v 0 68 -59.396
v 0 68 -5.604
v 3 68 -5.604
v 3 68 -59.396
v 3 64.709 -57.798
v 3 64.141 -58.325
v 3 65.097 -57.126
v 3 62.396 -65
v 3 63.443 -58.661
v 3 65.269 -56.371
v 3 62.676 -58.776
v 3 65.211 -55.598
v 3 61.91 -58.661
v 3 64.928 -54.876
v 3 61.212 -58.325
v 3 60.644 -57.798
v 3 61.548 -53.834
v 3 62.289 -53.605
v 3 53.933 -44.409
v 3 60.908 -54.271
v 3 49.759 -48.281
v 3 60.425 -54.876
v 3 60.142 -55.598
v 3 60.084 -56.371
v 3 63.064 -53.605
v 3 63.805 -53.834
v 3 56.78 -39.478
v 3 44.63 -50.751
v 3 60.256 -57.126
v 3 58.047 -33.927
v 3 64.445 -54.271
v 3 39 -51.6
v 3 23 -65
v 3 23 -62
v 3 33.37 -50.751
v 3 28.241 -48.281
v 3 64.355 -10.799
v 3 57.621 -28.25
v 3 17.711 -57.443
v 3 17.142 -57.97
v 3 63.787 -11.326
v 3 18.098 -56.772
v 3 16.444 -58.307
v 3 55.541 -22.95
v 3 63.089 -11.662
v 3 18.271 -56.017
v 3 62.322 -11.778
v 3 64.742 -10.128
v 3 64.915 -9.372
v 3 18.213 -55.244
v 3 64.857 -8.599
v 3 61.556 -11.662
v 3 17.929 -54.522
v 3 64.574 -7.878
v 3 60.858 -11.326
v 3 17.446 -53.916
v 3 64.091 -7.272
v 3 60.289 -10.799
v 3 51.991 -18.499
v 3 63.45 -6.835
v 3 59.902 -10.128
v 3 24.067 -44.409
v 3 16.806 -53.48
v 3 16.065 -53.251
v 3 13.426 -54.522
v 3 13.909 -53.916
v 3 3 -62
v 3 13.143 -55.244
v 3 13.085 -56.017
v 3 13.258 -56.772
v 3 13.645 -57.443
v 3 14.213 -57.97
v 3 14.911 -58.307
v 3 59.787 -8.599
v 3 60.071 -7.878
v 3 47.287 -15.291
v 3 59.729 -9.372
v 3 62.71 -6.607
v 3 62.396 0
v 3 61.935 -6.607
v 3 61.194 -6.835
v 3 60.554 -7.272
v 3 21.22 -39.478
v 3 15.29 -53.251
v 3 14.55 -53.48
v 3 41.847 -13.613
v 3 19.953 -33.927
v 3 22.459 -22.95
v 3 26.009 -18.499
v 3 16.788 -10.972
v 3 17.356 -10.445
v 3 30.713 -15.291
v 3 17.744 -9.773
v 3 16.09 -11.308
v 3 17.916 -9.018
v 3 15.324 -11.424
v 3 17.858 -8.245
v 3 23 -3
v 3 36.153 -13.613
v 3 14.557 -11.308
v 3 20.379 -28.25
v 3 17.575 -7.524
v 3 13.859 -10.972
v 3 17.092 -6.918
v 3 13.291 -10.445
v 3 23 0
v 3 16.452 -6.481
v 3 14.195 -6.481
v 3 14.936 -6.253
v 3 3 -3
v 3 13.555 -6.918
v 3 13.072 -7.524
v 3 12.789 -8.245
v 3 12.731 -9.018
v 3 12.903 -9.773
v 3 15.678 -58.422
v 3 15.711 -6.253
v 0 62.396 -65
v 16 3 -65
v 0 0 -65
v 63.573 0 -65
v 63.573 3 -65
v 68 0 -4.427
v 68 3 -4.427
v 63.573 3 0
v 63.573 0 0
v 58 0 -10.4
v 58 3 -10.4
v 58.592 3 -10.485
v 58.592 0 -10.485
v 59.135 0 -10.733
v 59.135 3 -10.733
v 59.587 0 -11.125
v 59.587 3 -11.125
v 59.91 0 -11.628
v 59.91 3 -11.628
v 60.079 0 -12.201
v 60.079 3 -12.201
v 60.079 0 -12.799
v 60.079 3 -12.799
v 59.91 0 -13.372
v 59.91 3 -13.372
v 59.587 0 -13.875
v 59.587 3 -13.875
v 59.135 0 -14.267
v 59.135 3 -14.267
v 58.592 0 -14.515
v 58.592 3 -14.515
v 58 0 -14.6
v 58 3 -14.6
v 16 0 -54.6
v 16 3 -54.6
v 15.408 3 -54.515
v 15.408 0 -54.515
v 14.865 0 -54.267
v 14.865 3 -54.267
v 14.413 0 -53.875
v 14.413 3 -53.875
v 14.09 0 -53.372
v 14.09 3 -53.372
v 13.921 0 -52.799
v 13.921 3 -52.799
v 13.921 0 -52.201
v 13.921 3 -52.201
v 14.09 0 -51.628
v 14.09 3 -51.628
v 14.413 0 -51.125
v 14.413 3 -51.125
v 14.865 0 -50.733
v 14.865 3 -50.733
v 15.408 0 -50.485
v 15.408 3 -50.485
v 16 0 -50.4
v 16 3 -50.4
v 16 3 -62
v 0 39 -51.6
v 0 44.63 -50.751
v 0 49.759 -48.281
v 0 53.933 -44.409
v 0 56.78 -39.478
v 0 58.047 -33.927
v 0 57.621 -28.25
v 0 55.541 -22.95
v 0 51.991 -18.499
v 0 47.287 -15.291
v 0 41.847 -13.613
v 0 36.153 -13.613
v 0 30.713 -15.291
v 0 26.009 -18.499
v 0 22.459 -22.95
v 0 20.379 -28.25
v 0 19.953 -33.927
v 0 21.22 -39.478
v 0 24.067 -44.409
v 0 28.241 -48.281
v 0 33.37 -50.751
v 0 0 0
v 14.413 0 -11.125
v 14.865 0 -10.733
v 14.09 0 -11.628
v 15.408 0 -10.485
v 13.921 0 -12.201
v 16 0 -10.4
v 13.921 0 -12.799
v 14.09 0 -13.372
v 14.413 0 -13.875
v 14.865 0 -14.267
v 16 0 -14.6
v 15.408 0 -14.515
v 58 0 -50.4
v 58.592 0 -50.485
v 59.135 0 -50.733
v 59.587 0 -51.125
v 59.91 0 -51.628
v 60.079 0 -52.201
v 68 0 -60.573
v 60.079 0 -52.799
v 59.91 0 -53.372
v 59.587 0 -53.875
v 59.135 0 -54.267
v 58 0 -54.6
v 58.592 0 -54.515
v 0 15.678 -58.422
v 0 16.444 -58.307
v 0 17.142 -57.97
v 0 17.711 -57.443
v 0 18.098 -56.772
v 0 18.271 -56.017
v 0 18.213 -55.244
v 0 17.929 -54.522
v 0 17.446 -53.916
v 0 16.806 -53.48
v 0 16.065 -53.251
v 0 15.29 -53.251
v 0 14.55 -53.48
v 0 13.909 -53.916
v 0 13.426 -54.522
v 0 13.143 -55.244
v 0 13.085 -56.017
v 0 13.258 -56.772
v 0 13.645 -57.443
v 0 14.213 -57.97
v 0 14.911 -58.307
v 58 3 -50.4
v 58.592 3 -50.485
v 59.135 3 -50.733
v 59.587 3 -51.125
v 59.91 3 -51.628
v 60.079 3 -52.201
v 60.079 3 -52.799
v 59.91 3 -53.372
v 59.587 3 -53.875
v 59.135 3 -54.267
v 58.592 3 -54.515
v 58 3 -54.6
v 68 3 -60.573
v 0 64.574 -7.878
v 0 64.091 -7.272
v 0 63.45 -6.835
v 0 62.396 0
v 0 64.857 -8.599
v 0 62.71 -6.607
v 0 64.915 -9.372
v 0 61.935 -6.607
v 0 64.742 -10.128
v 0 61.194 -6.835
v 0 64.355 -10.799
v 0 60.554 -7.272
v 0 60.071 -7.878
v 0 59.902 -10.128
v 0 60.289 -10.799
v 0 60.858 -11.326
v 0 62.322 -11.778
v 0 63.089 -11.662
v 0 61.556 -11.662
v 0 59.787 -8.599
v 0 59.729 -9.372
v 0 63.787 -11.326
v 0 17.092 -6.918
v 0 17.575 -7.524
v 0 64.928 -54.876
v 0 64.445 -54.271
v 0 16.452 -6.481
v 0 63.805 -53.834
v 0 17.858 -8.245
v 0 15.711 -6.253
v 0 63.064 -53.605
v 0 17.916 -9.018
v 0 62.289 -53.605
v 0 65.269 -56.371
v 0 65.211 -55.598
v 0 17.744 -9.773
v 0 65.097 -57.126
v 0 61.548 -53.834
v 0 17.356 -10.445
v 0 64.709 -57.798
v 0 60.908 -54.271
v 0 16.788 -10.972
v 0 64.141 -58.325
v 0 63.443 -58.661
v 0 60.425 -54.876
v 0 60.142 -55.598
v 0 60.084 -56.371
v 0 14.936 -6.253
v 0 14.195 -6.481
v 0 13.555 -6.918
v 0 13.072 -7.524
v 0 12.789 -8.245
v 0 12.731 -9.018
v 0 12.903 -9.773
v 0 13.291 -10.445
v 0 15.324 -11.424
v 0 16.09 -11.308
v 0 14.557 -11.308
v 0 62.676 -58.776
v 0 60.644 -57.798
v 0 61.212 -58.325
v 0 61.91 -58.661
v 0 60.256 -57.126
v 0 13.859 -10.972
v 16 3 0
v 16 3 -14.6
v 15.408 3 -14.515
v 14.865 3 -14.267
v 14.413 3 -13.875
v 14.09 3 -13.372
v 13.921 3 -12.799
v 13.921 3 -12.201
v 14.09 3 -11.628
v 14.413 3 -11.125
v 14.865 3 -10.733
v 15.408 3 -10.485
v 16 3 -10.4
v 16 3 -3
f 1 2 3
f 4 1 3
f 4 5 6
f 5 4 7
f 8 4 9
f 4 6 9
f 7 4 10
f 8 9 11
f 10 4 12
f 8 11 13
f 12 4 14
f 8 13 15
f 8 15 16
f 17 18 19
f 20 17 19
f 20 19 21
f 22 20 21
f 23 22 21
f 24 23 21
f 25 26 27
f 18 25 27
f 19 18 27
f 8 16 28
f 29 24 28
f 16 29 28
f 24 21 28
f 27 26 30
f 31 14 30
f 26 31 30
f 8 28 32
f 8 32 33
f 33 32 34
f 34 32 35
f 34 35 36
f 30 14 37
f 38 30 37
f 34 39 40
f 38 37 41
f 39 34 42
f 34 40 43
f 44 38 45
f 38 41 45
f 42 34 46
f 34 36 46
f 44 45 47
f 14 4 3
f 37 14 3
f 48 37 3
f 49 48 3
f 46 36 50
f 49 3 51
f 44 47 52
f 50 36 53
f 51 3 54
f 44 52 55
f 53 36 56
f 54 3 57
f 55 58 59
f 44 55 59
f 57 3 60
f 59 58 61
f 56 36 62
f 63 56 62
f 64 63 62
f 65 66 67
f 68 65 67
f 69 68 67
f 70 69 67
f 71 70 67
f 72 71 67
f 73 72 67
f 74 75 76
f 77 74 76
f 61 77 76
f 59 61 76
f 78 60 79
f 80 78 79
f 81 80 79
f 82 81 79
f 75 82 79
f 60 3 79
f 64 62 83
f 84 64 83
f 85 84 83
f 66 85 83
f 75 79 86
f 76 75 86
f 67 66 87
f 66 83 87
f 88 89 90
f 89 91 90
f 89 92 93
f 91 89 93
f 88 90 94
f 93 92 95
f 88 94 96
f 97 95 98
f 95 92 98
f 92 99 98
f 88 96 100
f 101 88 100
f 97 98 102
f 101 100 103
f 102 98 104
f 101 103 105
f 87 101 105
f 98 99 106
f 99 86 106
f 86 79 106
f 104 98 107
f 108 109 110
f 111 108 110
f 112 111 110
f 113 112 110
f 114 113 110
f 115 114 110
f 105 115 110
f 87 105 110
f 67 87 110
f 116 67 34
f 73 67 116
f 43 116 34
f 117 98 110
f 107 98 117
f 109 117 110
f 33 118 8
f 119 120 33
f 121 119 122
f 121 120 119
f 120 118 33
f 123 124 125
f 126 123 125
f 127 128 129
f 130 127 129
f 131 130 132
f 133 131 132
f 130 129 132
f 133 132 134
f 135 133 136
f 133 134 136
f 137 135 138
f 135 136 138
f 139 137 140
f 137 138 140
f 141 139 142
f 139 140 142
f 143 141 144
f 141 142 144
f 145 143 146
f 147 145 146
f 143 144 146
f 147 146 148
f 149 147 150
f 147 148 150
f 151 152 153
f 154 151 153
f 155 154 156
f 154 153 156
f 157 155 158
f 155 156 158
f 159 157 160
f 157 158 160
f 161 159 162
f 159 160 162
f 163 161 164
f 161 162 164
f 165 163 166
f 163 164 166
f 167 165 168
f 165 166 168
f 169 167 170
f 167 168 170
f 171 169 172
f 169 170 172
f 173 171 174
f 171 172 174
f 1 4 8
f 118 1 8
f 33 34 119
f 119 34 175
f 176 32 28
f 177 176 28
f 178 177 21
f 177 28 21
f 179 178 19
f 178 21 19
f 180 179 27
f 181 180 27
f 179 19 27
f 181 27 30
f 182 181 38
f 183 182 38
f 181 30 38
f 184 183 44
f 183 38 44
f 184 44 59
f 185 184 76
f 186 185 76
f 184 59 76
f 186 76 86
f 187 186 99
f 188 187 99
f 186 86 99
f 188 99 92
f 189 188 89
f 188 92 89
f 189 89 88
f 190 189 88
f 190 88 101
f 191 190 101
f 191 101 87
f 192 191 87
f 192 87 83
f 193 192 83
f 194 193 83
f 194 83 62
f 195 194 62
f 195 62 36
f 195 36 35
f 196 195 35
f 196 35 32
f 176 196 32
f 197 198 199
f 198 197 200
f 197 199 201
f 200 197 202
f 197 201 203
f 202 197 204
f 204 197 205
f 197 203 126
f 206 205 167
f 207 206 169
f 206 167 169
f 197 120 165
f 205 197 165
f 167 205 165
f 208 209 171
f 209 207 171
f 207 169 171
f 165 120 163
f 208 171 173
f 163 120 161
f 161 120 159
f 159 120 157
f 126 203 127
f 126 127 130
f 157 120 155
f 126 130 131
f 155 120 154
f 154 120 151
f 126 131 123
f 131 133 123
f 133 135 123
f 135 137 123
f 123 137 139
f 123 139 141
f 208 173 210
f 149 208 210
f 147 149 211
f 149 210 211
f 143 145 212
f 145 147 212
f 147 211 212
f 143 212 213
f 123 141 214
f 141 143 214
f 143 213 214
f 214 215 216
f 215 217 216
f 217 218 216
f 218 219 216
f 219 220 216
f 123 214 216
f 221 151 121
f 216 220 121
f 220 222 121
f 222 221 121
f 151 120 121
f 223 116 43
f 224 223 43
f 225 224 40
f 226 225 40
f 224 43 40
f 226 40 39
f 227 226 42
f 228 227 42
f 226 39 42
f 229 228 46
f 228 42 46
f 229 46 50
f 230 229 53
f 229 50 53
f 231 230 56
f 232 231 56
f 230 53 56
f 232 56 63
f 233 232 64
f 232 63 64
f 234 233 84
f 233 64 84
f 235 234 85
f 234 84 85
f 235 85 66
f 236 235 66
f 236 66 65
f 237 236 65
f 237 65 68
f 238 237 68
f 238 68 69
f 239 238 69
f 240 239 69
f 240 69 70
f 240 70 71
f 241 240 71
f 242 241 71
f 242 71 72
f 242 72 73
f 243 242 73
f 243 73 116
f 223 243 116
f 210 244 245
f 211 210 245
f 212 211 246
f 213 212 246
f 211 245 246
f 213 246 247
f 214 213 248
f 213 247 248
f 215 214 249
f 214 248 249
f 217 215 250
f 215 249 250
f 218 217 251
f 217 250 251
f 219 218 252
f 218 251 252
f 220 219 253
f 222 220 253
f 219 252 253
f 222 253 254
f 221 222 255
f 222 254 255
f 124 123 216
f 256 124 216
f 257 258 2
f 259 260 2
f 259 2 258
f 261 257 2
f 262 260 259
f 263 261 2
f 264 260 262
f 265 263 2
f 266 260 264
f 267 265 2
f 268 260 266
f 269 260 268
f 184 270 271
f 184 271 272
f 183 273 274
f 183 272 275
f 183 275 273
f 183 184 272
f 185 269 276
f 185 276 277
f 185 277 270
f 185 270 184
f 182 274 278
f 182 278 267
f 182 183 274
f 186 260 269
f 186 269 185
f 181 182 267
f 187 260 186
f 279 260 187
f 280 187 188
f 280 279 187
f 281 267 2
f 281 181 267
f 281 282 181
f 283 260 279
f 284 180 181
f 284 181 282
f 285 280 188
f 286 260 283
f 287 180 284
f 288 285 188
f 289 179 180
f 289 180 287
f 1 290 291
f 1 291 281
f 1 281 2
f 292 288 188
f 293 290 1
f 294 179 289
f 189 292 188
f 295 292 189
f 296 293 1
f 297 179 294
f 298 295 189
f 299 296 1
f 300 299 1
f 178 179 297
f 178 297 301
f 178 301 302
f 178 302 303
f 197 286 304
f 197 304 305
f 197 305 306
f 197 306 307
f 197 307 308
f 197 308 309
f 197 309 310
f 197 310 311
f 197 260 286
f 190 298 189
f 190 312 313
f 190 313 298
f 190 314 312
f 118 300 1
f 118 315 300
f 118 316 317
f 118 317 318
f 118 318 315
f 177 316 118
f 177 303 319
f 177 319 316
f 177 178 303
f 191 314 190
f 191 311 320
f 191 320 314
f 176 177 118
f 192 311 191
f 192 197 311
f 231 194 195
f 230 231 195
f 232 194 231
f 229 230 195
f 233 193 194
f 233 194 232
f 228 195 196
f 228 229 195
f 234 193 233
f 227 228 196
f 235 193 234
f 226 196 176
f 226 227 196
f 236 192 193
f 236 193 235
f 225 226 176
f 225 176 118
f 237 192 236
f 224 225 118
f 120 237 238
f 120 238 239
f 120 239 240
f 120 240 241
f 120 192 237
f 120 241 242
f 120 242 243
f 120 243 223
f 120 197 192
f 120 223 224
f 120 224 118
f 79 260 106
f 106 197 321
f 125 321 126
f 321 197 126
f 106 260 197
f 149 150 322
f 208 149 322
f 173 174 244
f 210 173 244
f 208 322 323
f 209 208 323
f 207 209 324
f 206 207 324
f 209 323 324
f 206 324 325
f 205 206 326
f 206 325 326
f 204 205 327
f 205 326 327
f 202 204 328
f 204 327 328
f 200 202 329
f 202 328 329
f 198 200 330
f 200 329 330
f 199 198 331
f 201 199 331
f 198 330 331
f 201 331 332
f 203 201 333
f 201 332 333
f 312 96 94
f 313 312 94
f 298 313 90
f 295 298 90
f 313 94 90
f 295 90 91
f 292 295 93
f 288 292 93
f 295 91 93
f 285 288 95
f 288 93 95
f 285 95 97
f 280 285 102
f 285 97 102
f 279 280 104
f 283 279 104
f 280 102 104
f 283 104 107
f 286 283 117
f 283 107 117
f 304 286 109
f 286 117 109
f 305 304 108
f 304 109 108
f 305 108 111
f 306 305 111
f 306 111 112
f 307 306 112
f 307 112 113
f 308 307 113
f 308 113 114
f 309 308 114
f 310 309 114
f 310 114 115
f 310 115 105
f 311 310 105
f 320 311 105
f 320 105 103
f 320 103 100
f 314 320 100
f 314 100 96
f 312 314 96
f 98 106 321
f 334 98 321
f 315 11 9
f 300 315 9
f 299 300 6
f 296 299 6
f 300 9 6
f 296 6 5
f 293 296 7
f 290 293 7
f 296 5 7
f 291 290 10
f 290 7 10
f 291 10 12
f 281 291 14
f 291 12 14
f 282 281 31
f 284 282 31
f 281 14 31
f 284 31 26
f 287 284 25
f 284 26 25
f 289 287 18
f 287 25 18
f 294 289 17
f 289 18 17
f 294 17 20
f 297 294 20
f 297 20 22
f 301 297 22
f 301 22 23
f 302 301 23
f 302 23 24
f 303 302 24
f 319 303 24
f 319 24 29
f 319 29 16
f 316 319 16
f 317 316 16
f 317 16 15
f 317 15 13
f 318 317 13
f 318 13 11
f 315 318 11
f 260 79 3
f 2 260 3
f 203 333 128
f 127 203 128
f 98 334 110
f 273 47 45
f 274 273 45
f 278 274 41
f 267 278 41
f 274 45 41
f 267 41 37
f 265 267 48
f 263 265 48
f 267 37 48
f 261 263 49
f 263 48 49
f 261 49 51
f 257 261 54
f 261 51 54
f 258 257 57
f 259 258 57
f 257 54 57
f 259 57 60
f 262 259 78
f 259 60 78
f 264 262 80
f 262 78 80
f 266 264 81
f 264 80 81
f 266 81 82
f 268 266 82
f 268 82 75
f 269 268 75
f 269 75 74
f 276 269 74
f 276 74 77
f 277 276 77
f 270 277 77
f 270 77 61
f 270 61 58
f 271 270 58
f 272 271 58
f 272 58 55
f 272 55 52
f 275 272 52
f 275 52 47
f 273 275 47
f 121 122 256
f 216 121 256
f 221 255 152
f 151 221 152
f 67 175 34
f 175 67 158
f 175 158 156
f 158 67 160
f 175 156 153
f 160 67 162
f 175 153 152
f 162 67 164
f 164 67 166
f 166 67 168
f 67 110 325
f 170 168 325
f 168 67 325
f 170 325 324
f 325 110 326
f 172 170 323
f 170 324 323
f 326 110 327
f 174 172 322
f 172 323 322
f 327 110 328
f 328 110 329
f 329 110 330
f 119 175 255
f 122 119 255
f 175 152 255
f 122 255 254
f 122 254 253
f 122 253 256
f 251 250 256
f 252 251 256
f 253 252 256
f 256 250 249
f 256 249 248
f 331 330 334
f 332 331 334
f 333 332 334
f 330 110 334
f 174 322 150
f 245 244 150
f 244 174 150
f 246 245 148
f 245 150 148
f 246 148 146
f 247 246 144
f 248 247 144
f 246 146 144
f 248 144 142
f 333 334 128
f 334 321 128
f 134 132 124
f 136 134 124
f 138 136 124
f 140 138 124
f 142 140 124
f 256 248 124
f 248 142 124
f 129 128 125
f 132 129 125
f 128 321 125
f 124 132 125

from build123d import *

# Parameters (mm, degrees)
SKETCH1_W           = 68
SKETCH1_H           = 65
BOSS_EXTRUDE1_DEPTH = 68
CUT_EXTRUDE1_DEPTH  = 66
SKETCH3_W           = 59
SKETCH3_H           = 20
CUT_EXTRUDE2_DEPTH  = 65
SKETCH4_R           = 19.1
SKETCH4_R_2         = 2.6
CUT_EXTRUDE3_DEPTH  = 4
CUT_EXTRUDE4_DEPTH  = 4


with BuildPart() as part:
    # Sketch1 → Boss-Extrude1 (new body)
    with BuildSketch(Plane(origin=(0, 0, 0), x_dir=(1, 0, 0), z_dir=(0, 1, 0))):
        with Locations((34, 32.5)):
            Rectangle(SKETCH1_W, SKETCH1_H)
    extrude(amount=BOSS_EXTRUDE1_DEPTH)

    # Sketch2 → Cut-Extrude1 (cut, through all)
    with BuildSketch(Plane.XY):
        Polygon((68, 68), (3, 68), (3, 23), (16, 3), (68, 3), align=None)
    extrude(amount=-CUT_EXTRUDE1_DEPTH, mode=Mode.SUBTRACT)

    # Sketch3 → Cut-Extrude2 (cut)
    with BuildSketch(Plane(origin=(68, 0, 0), x_dir=(0, 0, -1), z_dir=(1, 0, 0))):
        with Locations((32.5, 13)):
            Rectangle(SKETCH3_W, SKETCH3_H)
    extrude(amount=-CUT_EXTRUDE2_DEPTH, mode=Mode.SUBTRACT)

    # Sketch4 → Cut-Extrude3 (cut, through all)
    with BuildSketch(Plane(origin=(3, 0, 0), x_dir=(0, 0, -1), z_dir=(1, 0, 0))):
        Polygon((0, 68), (0, 62.395835051), (5.604164949, 68), align=None)
        Polygon((65, 68), (59.395835051, 68), (65, 62.395835051), align=None)
        with Locations((32.5, 39)):
            Circle(SKETCH4_R)
        with Locations((55.822217793, 15.677782207)):
            Circle(SKETCH4_R_2)
        with Locations((56.176447309, 62.676447309)):
            Circle(SKETCH4_R_2)
        with Locations((9.177782207, 62.322217793)):
            Circle(SKETCH4_R_2)
        with Locations((8.823552691, 15.323552691)):
            Circle(SKETCH4_R_2)
    extrude(amount=-CUT_EXTRUDE3_DEPTH, mode=Mode.SUBTRACT)

    # Sketch5 → Cut-Extrude4 (cut, through all)
    with BuildSketch(Plane(origin=(0, 3, 0), x_dir=(1, 0, 0), z_dir=(0, 1, 0))):
        with BuildLine():
            Line((58, 54.6), (16, 54.6))
            ThreePointArc((16, 54.6), (13.9, 52.5), (16, 50.4))
            Line((16, 50.4), (58, 50.4))
            ThreePointArc((58, 50.4), (60.1, 52.5), (58, 54.6))
        make_face()
        Polygon((68, 65), (63.573477358, 65), (68, 60.573477358), align=None)
        Polygon((68, 4.426522642), (63.573477358, 0), (68, 0), align=None)
        with BuildLine():
            Line((16, 10.4), (58, 10.4))
            ThreePointArc((58, 10.4), (60.1, 12.5), (58, 14.6))
            Line((58, 14.6), (16, 14.6))
            ThreePointArc((16, 14.6), (13.9, 12.5), (16, 10.4))
        make_face()
    extrude(amount=-CUT_EXTRUDE4_DEPTH, mode=Mode.SUBTRACT)


solid = part.part
